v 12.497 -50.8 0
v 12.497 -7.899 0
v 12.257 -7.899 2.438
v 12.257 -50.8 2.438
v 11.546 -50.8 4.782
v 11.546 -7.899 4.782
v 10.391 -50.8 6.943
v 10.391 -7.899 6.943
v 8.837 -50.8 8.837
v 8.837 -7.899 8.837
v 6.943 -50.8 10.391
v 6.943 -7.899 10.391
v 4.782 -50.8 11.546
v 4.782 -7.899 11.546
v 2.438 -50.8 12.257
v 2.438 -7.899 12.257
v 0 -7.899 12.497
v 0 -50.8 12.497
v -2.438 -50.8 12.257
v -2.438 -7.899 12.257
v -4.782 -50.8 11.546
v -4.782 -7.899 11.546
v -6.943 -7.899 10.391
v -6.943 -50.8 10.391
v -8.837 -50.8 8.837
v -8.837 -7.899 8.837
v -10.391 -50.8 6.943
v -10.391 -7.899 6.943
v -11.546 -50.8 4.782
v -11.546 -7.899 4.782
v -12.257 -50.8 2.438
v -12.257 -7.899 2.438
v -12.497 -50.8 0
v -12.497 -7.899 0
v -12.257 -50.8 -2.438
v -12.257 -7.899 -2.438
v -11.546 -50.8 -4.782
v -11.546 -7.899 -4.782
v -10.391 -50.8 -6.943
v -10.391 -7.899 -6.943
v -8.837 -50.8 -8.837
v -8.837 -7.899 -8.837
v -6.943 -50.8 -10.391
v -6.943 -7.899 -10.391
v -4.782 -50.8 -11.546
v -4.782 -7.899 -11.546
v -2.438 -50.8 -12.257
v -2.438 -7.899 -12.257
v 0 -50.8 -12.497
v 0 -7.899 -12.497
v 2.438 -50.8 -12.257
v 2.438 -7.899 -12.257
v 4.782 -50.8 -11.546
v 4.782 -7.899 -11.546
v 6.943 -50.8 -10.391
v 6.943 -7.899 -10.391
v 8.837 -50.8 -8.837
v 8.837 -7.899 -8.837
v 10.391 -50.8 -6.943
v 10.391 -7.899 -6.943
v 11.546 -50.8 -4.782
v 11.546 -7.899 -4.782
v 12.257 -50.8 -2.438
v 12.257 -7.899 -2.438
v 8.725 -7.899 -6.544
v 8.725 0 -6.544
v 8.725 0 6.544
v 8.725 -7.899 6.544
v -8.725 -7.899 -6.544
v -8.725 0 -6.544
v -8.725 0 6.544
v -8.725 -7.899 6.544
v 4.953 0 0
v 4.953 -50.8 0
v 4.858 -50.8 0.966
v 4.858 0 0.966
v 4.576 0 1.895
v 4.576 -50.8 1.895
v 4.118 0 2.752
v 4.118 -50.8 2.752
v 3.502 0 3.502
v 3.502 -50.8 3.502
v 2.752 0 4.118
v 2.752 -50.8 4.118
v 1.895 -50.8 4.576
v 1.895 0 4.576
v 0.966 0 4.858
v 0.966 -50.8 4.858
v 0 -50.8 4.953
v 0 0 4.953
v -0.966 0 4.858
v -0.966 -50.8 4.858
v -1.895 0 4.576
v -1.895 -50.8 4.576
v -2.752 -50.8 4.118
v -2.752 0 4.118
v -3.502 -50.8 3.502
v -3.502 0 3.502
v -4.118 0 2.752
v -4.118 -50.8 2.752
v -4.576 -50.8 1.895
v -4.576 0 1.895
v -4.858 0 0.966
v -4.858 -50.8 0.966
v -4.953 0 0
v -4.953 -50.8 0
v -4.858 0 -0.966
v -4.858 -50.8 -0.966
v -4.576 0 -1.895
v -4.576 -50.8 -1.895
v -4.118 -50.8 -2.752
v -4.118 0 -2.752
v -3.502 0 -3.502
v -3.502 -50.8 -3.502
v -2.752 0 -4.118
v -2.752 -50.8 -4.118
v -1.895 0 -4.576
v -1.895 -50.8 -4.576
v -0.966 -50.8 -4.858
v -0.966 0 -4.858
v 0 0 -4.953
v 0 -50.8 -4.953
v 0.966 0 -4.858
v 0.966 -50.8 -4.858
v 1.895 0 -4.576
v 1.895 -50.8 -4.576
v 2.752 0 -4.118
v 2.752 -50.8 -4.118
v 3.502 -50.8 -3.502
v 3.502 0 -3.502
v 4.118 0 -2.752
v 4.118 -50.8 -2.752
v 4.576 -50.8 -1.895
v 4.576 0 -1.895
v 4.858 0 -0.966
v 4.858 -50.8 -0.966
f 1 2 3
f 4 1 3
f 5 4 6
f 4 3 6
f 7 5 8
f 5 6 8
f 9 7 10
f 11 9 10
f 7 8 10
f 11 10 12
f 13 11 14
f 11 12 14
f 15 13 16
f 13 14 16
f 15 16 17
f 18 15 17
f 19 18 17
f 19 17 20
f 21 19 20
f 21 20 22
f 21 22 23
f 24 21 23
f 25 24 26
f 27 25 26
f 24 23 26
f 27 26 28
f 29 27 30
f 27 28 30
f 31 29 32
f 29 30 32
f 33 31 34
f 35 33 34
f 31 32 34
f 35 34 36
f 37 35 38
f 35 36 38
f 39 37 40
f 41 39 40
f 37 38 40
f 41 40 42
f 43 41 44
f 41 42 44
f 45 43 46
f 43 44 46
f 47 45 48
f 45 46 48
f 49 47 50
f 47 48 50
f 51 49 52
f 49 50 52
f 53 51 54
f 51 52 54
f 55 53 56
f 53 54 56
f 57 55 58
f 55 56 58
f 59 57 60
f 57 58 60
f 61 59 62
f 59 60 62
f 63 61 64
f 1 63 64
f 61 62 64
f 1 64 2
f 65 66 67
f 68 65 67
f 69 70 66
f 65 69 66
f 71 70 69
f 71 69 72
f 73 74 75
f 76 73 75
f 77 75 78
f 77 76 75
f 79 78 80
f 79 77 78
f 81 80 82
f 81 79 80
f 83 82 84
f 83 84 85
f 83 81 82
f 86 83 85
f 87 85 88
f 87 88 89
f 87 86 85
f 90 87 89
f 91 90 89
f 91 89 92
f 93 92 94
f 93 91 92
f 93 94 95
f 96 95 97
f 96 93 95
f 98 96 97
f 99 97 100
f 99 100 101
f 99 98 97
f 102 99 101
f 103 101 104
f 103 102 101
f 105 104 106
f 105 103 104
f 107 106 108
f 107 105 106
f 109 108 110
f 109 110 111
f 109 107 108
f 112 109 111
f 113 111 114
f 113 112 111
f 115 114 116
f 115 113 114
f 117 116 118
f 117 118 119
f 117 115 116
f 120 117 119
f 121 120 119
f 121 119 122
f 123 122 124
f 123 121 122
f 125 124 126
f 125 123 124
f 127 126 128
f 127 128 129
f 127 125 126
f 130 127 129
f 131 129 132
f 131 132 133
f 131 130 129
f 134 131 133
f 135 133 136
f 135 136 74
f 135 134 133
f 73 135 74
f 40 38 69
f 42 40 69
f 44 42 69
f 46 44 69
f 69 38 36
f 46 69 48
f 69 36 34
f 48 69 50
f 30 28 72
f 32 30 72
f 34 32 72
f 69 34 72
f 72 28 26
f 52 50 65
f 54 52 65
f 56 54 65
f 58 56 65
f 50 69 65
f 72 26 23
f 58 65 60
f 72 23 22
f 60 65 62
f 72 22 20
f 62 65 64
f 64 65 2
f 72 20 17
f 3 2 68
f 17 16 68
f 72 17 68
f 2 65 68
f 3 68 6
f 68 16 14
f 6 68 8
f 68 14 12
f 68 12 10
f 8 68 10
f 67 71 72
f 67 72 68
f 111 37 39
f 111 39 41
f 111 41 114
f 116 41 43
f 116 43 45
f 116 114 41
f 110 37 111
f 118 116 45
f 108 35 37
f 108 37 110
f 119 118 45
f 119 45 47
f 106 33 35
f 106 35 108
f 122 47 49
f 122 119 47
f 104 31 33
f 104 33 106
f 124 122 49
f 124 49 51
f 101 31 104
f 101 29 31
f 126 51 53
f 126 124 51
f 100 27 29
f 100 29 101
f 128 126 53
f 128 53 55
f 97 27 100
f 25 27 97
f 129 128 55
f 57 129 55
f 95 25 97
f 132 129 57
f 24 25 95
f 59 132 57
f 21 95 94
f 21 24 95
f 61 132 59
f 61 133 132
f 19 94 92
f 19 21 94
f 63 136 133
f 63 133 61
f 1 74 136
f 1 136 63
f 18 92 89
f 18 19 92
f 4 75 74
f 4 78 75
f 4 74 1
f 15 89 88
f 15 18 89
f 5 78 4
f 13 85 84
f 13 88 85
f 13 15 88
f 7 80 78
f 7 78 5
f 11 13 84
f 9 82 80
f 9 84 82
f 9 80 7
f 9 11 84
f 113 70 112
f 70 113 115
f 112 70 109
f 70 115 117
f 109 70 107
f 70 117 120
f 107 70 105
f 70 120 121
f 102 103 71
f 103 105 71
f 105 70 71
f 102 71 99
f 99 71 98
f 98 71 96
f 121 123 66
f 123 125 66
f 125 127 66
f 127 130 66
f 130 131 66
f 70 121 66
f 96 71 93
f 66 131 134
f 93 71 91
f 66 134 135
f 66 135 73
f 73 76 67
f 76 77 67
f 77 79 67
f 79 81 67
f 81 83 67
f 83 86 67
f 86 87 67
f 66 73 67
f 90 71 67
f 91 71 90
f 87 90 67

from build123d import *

# Parameters (mm, degrees)
F2_W     = 17.4498
F2_H     = 13.087348
F4_DEPTH = 7.8994
F3_R     = 12.4968
F5_DEPTH = 42.9006
F1_R     = 4.953
F6_DEPTH = 50.8


with BuildPart() as f4:
    # F2 (on Front) → F4 (new body)
    with BuildSketch(Plane.XZ):
        Rectangle(F2_W, F2_H)
    extrude(amount=F4_DEPTH)

    # F3 (on offset) → F5 (join)
    with BuildSketch(Plane.XZ.offset(7.8994)):
        Circle(F3_R)
    extrude(amount=F5_DEPTH)

    # F1 (on Front) → F6 (cut)
    with BuildSketch(Plane.XZ):
        Circle(F1_R)
    extrude(amount=F6_DEPTH, mode=Mode.SUBTRACT)


solid = f4.part
